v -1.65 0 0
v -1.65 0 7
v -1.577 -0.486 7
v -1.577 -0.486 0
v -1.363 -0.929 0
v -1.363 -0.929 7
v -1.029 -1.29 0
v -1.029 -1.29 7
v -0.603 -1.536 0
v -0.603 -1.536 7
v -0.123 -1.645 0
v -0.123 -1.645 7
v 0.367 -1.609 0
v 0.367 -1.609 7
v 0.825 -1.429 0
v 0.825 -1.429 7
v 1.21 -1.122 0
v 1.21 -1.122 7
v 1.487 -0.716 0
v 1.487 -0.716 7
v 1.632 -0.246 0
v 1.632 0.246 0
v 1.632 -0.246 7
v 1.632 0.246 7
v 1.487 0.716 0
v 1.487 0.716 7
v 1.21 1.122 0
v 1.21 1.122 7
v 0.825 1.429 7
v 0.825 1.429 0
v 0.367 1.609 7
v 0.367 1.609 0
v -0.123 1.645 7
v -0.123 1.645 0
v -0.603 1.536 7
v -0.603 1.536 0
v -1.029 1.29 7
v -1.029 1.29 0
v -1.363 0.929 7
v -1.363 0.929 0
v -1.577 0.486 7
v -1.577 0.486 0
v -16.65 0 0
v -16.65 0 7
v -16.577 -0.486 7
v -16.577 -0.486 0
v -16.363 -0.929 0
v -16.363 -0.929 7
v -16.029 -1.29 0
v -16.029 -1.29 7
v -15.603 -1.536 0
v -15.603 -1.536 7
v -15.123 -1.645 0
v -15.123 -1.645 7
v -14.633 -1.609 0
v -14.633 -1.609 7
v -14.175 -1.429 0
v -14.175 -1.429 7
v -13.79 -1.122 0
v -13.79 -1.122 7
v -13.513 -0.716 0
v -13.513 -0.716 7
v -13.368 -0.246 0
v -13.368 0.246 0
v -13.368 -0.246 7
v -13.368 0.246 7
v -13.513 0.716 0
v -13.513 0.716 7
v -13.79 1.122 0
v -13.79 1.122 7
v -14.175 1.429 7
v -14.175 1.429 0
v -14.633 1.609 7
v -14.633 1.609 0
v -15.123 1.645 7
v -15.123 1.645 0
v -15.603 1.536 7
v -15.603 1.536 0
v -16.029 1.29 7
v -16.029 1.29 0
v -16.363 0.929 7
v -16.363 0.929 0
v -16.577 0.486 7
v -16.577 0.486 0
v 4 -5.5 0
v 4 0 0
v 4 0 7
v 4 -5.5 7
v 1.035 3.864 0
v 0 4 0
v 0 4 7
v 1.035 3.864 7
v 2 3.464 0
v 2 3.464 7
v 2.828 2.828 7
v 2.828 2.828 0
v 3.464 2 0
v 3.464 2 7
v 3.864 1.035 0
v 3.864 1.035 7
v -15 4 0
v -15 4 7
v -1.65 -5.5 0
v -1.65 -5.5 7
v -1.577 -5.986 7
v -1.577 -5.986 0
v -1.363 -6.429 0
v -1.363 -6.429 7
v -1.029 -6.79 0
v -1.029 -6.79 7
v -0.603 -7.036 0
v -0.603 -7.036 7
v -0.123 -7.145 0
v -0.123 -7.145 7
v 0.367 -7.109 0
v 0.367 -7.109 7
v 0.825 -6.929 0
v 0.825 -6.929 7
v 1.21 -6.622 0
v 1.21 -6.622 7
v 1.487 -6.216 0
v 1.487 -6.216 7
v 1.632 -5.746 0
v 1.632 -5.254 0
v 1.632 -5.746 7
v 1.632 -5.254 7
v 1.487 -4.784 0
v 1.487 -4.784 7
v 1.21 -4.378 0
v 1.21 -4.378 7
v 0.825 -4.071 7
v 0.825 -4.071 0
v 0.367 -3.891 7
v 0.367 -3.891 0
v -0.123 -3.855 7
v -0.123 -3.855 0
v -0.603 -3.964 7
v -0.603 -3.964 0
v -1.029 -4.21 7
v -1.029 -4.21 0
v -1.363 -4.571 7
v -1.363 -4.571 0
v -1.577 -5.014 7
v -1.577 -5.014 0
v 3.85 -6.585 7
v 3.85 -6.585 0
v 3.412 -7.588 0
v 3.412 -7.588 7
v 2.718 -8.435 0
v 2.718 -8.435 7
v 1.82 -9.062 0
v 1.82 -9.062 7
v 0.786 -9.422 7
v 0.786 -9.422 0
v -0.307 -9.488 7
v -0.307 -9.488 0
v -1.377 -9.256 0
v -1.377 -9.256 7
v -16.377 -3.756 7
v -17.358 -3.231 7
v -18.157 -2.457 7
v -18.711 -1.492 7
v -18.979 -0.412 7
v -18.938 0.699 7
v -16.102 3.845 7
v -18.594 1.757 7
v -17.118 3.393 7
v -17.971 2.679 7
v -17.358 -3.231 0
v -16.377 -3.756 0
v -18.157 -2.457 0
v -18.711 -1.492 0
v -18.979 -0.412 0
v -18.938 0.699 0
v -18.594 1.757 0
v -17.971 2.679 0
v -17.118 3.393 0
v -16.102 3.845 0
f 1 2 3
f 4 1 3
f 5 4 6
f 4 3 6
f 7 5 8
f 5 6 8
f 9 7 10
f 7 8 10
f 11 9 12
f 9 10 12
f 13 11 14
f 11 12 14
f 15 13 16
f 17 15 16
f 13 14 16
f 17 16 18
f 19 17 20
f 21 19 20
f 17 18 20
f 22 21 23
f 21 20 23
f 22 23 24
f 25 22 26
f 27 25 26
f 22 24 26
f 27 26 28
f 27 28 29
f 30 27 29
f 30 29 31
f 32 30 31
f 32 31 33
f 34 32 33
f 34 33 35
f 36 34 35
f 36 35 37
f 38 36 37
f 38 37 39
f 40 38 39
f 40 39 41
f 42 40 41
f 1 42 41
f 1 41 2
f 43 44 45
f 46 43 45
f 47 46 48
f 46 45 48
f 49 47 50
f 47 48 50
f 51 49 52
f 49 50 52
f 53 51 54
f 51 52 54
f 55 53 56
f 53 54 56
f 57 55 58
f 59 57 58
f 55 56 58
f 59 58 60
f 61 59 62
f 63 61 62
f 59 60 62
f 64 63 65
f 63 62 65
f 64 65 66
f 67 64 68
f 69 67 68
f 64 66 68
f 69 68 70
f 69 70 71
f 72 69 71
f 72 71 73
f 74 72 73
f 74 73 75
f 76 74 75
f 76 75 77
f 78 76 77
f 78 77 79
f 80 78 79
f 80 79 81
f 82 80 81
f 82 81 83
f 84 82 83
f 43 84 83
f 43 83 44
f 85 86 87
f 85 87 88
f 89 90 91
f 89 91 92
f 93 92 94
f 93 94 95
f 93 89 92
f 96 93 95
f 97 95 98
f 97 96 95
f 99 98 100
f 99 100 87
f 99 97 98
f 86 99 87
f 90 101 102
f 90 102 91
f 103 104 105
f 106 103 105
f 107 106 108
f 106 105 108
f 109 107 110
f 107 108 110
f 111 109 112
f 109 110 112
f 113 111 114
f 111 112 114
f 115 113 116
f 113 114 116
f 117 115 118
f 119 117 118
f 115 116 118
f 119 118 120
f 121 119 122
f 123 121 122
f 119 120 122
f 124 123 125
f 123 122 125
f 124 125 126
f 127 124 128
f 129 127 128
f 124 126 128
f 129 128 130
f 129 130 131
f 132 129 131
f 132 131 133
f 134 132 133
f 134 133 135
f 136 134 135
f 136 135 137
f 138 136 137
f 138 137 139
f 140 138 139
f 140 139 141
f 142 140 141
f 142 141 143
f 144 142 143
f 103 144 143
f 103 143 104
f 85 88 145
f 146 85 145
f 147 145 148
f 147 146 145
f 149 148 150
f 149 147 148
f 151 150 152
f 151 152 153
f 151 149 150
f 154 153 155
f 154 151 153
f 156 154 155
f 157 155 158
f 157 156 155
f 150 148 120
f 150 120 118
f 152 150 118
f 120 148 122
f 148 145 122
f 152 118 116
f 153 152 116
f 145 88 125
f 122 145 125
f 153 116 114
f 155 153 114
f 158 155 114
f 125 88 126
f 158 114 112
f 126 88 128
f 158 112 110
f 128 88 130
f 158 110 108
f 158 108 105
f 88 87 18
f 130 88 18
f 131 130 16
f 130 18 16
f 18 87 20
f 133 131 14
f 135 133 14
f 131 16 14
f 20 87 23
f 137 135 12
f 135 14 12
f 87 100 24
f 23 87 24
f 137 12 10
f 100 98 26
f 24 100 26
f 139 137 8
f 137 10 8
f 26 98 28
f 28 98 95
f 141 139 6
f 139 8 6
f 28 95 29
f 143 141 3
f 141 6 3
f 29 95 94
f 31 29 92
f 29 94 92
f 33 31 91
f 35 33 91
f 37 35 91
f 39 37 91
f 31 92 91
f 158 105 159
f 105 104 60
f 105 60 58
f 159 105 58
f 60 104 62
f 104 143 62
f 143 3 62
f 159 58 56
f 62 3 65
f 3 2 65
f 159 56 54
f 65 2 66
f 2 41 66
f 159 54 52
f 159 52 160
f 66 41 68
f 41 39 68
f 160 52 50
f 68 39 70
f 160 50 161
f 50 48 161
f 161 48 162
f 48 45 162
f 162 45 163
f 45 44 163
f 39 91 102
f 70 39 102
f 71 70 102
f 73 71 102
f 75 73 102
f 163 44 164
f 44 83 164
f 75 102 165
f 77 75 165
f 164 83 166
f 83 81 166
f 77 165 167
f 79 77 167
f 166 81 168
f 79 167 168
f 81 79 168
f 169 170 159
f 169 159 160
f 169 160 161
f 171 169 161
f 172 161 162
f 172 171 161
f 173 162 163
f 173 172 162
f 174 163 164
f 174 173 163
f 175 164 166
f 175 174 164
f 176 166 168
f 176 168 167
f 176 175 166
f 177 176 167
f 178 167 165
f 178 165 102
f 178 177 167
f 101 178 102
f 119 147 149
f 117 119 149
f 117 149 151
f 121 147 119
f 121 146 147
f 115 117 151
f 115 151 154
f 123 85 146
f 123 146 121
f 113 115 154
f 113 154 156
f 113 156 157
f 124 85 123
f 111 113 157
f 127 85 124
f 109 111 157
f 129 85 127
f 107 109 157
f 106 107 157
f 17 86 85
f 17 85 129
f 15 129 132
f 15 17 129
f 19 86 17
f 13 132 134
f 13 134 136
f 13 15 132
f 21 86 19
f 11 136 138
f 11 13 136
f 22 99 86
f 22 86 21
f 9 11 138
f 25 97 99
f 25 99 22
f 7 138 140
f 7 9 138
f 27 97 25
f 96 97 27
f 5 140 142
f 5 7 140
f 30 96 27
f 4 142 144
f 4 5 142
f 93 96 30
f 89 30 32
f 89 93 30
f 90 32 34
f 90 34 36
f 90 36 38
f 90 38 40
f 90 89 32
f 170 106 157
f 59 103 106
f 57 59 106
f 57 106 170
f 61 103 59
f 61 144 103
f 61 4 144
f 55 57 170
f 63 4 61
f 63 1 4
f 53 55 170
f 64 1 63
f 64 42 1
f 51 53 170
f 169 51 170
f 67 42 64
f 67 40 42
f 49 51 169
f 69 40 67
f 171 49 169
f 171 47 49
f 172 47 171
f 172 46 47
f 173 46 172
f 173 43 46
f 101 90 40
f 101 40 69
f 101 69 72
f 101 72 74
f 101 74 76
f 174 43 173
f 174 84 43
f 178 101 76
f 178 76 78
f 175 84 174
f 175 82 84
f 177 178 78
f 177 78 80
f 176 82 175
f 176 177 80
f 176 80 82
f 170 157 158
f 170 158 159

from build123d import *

# Parameters (mm, degrees)
BOSS_EXTRU_1_DEPTH = 7
TROU_TARAUD_M41_D  = 3.3


with BuildPart() as part:
    # Esquisse1 → Boss.-Extru.1 (new body)
    with BuildSketch(Plane.XY):
        with BuildLine():
            Line((-15, 4), (0, 4))
            ThreePointArc((0, 4), (2.828427125, 2.828427125), (4, 0))
            Line((4, 0), (4, -5.5))
            ThreePointArc((4, -5.5), (2.29040669, -8.779334871), (-1.377018597, -9.255505264))
            Line((-1.377018597, -9.255505264), (-16.377018597, -3.755505264))
            ThreePointArc((-16.377018597, -3.755505264), (-18.938402027, 0.699277822), (-15, 4))
        make_face()
    extrude(amount=BOSS_EXTRU_1_DEPTH)

    # Trou taraudé M41 (through all)
    with Locations(Plane(origin=(0, 0, 0), x_dir=(1, 0, 0), z_dir=(0, 0, -1))):
        with Locations((-15, 0), (0, 0), (0, 5.5)):
            Hole(TROU_TARAUD_M41_D / 2)


solid = part.part
